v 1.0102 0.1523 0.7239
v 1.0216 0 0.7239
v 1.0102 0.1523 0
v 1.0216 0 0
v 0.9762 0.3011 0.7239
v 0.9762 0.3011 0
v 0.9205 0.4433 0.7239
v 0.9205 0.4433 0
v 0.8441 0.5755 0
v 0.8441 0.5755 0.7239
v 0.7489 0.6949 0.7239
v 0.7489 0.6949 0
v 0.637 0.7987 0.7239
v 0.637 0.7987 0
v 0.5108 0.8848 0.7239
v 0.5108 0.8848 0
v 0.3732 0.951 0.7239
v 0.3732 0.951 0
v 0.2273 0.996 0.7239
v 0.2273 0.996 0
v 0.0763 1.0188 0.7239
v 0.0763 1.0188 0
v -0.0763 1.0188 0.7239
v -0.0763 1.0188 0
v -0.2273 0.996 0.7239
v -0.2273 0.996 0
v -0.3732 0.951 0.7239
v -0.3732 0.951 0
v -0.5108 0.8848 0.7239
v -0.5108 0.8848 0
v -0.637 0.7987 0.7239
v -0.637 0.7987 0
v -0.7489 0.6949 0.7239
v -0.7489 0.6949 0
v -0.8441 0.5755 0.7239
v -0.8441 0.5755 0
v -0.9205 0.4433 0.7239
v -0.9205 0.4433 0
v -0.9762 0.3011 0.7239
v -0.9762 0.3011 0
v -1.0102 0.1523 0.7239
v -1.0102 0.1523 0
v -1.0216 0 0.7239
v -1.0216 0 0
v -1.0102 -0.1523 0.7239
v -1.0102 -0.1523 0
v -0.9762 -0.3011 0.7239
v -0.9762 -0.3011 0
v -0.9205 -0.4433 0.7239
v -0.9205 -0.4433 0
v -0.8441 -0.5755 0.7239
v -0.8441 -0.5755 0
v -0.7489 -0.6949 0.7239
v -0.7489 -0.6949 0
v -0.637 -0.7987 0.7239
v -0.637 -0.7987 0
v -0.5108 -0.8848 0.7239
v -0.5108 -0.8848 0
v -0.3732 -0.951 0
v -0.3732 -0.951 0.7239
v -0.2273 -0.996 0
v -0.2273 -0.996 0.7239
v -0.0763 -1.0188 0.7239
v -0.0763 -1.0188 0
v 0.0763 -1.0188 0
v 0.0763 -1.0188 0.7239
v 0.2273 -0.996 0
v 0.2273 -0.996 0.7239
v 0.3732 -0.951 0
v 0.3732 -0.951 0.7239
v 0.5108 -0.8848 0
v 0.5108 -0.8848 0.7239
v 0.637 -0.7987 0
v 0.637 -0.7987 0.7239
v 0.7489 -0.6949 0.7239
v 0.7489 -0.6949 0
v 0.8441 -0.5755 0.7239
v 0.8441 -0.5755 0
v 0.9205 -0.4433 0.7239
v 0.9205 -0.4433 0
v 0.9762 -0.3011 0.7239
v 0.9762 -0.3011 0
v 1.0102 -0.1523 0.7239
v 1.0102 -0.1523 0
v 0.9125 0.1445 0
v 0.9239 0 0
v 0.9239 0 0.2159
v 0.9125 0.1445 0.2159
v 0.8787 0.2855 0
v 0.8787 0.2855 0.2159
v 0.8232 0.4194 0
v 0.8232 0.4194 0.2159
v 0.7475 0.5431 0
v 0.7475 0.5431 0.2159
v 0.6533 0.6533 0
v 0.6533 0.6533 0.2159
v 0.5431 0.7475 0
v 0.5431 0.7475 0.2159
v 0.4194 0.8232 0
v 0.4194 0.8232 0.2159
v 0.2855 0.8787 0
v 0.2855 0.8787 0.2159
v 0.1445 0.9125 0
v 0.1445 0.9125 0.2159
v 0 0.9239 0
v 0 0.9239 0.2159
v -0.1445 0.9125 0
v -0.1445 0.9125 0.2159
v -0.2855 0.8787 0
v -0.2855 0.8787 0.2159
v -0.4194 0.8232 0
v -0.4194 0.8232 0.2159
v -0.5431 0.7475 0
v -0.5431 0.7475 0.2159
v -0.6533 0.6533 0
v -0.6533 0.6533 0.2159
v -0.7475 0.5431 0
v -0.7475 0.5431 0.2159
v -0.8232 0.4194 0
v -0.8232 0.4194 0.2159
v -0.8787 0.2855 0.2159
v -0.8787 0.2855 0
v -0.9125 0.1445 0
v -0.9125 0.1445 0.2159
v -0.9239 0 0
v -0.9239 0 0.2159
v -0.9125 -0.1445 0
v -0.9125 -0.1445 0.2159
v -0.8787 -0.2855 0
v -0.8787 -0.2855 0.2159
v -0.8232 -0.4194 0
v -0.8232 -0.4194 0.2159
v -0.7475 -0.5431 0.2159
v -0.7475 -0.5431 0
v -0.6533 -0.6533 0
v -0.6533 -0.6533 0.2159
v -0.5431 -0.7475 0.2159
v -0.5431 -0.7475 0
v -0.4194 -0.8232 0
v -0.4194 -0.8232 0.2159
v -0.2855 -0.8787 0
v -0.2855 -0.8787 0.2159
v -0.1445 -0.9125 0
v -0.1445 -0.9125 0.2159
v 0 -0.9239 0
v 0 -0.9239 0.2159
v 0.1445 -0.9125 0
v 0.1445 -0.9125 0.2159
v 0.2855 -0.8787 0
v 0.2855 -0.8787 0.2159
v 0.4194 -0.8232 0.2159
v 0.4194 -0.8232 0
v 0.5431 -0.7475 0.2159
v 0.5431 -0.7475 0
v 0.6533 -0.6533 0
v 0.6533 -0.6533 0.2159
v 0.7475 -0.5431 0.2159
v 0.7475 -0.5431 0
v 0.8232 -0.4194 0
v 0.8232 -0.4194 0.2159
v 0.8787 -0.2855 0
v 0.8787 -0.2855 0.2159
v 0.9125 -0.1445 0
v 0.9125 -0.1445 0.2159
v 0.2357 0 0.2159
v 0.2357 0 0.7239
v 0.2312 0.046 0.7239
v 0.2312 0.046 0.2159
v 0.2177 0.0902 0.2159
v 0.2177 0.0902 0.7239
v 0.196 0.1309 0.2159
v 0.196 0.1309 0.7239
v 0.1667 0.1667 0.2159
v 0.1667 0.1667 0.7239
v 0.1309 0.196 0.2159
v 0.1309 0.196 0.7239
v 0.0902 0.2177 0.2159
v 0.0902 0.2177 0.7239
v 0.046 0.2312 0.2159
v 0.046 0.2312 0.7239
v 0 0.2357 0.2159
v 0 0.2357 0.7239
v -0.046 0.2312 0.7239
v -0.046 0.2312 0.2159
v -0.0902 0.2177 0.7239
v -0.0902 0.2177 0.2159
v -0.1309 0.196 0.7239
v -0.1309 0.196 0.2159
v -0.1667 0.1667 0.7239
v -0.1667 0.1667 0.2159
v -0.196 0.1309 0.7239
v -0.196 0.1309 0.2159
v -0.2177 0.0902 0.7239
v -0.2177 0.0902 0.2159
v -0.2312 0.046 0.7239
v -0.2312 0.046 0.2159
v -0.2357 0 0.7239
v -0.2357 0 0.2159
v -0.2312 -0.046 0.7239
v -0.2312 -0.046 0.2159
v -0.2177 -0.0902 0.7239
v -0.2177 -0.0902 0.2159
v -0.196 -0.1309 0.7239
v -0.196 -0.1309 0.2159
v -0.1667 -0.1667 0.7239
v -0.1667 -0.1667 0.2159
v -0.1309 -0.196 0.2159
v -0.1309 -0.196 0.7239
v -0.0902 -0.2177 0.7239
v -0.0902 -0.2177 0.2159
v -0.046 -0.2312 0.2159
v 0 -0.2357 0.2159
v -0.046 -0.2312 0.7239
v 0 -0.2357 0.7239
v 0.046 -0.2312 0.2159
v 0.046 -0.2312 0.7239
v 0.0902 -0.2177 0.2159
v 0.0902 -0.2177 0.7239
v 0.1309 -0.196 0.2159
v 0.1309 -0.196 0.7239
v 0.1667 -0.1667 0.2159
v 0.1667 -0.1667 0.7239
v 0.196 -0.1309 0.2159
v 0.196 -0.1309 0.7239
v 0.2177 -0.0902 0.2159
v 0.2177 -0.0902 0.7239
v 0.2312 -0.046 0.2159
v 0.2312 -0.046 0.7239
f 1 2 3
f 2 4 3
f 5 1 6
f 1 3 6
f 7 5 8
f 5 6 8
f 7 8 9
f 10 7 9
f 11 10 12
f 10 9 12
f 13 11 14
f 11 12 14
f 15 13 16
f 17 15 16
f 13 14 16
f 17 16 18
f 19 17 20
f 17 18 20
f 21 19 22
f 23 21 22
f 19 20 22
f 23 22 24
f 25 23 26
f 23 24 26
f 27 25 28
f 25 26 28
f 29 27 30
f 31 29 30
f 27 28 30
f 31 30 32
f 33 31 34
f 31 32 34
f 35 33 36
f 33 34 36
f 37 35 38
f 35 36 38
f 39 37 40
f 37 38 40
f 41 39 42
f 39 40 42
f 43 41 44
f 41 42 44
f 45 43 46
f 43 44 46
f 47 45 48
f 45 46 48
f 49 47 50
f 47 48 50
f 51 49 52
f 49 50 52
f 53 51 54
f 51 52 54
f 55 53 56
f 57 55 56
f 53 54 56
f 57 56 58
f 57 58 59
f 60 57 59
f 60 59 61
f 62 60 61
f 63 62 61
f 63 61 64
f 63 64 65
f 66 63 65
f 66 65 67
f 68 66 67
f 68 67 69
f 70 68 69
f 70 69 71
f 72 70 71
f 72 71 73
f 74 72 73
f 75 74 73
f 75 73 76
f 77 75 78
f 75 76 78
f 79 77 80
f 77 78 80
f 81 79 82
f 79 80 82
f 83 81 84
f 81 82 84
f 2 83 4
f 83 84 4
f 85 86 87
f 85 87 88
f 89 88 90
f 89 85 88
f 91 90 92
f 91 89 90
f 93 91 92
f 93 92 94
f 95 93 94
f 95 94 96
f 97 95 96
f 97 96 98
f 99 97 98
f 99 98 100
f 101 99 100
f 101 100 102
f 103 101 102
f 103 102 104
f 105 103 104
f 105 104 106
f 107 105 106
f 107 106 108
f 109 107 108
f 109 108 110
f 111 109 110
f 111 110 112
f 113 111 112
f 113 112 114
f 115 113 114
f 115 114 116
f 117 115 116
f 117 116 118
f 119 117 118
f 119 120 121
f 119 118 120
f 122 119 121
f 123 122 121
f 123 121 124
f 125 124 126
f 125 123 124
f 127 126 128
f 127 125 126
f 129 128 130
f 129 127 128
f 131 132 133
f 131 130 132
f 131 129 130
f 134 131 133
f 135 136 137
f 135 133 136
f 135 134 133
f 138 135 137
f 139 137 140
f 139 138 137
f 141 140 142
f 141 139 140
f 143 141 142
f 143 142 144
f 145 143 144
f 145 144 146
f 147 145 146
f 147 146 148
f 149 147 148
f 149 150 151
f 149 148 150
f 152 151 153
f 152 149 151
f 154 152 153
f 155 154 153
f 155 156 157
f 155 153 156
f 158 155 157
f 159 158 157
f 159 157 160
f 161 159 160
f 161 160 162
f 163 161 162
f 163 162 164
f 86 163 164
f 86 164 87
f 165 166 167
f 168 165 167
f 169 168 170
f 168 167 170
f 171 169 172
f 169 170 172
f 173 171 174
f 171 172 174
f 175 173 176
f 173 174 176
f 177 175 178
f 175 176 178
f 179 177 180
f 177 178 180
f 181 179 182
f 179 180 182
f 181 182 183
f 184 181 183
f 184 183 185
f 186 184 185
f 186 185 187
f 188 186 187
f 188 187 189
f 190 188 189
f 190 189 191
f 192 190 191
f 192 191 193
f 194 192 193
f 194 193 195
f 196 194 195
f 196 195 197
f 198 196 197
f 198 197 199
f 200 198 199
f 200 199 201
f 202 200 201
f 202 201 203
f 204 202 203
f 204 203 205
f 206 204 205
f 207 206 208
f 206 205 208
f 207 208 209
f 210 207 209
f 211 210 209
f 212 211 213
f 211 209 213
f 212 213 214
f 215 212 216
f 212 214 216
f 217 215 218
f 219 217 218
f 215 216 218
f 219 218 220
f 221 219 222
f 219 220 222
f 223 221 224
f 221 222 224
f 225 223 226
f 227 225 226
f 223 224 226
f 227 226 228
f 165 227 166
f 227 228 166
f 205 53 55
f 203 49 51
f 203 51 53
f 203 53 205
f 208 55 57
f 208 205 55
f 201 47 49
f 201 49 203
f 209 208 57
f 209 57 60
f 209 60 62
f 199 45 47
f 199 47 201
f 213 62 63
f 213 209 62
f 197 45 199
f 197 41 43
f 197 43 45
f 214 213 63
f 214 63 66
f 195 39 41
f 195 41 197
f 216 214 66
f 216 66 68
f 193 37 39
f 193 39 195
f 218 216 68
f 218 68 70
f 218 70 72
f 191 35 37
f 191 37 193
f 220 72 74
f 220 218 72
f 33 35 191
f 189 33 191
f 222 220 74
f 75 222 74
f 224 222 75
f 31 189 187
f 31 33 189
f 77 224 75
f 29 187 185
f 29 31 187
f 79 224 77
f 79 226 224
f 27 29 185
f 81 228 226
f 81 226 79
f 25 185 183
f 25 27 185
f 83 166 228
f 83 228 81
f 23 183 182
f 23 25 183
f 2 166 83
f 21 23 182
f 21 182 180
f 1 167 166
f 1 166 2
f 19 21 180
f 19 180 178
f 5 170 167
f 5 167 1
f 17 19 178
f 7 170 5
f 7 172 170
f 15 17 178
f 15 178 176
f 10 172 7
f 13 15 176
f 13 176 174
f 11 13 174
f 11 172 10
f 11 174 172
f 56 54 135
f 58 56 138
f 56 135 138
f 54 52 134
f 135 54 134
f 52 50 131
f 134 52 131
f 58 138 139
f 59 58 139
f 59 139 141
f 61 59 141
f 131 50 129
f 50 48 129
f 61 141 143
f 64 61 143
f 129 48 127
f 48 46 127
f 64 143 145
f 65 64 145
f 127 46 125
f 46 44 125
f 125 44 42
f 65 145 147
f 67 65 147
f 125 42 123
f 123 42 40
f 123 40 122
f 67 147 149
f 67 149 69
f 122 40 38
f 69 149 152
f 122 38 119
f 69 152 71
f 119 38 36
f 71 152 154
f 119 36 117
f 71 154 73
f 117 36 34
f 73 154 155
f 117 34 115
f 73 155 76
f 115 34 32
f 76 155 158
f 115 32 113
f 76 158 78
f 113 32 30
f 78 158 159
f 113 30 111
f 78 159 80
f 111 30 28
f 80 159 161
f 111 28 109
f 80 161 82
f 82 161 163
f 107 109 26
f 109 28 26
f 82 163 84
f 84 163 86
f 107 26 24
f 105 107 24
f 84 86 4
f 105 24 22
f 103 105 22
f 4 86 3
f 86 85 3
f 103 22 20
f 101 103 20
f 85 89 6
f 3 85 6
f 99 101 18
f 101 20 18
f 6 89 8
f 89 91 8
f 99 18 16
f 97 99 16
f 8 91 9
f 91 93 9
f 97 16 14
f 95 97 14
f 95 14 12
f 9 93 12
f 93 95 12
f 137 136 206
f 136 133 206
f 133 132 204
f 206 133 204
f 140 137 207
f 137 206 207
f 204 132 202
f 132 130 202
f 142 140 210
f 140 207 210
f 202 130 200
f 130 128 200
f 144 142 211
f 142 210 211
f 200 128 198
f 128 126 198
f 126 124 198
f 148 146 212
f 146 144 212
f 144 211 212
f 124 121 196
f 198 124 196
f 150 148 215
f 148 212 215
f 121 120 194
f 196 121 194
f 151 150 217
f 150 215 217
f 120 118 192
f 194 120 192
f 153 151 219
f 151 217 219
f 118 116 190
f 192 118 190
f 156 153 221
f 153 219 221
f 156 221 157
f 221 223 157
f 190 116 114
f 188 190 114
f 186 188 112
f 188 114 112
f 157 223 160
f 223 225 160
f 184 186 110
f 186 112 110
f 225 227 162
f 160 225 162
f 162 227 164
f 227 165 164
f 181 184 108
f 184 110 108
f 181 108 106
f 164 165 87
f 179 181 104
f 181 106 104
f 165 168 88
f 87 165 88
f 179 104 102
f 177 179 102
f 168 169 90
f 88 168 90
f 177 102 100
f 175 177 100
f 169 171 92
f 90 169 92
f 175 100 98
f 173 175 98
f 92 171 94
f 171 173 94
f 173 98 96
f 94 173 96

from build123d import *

# Parameters (mm, degrees)
F0_R      = 1.0216326818
F1_DEPTH  = 0.2159
F2_R      = 0.9238996
F1_FACE_R = 1.0216326818
F3_DEPTH  = 0.424434
F4_R      = 1.0216326818
F4_R_2    = 0.9238996
F5_DEPTH  = 0.508
F6_R      = 0.2356788085
F7_DEPTH  = 25.4


with BuildPart() as f1:
    # F0 (on Top) → F1 (new body)
    with BuildSketch(Plane.XY):
        Circle(F0_R)
    extrude(amount=F1_DEPTH)

    # F2 (on Top) + F1_face (on face) → F3 (cut)
    with BuildSketch(Plane.XY):
        Circle(F2_R)
    with BuildSketch(Plane.XY.offset(0.2159)):
        Circle(F1_FACE_R)
    extrude(amount=F3_DEPTH, mode=Mode.SUBTRACT)

    # F4 (on face) → F5 (join)
    with BuildSketch(Plane.XY.offset(0.2159)):
        Circle(F4_R)
        Circle(F4_R_2, mode=Mode.SUBTRACT)
        Circle(F4_R_2)
    extrude(amount=F5_DEPTH)

    # F6 (on face) → F7 (cut)
    with BuildSketch(Plane.XY.offset(0.7239)):
        Circle(F6_R)
    extrude(amount=-F7_DEPTH, mode=Mode.SUBTRACT)


solid = f1.part
